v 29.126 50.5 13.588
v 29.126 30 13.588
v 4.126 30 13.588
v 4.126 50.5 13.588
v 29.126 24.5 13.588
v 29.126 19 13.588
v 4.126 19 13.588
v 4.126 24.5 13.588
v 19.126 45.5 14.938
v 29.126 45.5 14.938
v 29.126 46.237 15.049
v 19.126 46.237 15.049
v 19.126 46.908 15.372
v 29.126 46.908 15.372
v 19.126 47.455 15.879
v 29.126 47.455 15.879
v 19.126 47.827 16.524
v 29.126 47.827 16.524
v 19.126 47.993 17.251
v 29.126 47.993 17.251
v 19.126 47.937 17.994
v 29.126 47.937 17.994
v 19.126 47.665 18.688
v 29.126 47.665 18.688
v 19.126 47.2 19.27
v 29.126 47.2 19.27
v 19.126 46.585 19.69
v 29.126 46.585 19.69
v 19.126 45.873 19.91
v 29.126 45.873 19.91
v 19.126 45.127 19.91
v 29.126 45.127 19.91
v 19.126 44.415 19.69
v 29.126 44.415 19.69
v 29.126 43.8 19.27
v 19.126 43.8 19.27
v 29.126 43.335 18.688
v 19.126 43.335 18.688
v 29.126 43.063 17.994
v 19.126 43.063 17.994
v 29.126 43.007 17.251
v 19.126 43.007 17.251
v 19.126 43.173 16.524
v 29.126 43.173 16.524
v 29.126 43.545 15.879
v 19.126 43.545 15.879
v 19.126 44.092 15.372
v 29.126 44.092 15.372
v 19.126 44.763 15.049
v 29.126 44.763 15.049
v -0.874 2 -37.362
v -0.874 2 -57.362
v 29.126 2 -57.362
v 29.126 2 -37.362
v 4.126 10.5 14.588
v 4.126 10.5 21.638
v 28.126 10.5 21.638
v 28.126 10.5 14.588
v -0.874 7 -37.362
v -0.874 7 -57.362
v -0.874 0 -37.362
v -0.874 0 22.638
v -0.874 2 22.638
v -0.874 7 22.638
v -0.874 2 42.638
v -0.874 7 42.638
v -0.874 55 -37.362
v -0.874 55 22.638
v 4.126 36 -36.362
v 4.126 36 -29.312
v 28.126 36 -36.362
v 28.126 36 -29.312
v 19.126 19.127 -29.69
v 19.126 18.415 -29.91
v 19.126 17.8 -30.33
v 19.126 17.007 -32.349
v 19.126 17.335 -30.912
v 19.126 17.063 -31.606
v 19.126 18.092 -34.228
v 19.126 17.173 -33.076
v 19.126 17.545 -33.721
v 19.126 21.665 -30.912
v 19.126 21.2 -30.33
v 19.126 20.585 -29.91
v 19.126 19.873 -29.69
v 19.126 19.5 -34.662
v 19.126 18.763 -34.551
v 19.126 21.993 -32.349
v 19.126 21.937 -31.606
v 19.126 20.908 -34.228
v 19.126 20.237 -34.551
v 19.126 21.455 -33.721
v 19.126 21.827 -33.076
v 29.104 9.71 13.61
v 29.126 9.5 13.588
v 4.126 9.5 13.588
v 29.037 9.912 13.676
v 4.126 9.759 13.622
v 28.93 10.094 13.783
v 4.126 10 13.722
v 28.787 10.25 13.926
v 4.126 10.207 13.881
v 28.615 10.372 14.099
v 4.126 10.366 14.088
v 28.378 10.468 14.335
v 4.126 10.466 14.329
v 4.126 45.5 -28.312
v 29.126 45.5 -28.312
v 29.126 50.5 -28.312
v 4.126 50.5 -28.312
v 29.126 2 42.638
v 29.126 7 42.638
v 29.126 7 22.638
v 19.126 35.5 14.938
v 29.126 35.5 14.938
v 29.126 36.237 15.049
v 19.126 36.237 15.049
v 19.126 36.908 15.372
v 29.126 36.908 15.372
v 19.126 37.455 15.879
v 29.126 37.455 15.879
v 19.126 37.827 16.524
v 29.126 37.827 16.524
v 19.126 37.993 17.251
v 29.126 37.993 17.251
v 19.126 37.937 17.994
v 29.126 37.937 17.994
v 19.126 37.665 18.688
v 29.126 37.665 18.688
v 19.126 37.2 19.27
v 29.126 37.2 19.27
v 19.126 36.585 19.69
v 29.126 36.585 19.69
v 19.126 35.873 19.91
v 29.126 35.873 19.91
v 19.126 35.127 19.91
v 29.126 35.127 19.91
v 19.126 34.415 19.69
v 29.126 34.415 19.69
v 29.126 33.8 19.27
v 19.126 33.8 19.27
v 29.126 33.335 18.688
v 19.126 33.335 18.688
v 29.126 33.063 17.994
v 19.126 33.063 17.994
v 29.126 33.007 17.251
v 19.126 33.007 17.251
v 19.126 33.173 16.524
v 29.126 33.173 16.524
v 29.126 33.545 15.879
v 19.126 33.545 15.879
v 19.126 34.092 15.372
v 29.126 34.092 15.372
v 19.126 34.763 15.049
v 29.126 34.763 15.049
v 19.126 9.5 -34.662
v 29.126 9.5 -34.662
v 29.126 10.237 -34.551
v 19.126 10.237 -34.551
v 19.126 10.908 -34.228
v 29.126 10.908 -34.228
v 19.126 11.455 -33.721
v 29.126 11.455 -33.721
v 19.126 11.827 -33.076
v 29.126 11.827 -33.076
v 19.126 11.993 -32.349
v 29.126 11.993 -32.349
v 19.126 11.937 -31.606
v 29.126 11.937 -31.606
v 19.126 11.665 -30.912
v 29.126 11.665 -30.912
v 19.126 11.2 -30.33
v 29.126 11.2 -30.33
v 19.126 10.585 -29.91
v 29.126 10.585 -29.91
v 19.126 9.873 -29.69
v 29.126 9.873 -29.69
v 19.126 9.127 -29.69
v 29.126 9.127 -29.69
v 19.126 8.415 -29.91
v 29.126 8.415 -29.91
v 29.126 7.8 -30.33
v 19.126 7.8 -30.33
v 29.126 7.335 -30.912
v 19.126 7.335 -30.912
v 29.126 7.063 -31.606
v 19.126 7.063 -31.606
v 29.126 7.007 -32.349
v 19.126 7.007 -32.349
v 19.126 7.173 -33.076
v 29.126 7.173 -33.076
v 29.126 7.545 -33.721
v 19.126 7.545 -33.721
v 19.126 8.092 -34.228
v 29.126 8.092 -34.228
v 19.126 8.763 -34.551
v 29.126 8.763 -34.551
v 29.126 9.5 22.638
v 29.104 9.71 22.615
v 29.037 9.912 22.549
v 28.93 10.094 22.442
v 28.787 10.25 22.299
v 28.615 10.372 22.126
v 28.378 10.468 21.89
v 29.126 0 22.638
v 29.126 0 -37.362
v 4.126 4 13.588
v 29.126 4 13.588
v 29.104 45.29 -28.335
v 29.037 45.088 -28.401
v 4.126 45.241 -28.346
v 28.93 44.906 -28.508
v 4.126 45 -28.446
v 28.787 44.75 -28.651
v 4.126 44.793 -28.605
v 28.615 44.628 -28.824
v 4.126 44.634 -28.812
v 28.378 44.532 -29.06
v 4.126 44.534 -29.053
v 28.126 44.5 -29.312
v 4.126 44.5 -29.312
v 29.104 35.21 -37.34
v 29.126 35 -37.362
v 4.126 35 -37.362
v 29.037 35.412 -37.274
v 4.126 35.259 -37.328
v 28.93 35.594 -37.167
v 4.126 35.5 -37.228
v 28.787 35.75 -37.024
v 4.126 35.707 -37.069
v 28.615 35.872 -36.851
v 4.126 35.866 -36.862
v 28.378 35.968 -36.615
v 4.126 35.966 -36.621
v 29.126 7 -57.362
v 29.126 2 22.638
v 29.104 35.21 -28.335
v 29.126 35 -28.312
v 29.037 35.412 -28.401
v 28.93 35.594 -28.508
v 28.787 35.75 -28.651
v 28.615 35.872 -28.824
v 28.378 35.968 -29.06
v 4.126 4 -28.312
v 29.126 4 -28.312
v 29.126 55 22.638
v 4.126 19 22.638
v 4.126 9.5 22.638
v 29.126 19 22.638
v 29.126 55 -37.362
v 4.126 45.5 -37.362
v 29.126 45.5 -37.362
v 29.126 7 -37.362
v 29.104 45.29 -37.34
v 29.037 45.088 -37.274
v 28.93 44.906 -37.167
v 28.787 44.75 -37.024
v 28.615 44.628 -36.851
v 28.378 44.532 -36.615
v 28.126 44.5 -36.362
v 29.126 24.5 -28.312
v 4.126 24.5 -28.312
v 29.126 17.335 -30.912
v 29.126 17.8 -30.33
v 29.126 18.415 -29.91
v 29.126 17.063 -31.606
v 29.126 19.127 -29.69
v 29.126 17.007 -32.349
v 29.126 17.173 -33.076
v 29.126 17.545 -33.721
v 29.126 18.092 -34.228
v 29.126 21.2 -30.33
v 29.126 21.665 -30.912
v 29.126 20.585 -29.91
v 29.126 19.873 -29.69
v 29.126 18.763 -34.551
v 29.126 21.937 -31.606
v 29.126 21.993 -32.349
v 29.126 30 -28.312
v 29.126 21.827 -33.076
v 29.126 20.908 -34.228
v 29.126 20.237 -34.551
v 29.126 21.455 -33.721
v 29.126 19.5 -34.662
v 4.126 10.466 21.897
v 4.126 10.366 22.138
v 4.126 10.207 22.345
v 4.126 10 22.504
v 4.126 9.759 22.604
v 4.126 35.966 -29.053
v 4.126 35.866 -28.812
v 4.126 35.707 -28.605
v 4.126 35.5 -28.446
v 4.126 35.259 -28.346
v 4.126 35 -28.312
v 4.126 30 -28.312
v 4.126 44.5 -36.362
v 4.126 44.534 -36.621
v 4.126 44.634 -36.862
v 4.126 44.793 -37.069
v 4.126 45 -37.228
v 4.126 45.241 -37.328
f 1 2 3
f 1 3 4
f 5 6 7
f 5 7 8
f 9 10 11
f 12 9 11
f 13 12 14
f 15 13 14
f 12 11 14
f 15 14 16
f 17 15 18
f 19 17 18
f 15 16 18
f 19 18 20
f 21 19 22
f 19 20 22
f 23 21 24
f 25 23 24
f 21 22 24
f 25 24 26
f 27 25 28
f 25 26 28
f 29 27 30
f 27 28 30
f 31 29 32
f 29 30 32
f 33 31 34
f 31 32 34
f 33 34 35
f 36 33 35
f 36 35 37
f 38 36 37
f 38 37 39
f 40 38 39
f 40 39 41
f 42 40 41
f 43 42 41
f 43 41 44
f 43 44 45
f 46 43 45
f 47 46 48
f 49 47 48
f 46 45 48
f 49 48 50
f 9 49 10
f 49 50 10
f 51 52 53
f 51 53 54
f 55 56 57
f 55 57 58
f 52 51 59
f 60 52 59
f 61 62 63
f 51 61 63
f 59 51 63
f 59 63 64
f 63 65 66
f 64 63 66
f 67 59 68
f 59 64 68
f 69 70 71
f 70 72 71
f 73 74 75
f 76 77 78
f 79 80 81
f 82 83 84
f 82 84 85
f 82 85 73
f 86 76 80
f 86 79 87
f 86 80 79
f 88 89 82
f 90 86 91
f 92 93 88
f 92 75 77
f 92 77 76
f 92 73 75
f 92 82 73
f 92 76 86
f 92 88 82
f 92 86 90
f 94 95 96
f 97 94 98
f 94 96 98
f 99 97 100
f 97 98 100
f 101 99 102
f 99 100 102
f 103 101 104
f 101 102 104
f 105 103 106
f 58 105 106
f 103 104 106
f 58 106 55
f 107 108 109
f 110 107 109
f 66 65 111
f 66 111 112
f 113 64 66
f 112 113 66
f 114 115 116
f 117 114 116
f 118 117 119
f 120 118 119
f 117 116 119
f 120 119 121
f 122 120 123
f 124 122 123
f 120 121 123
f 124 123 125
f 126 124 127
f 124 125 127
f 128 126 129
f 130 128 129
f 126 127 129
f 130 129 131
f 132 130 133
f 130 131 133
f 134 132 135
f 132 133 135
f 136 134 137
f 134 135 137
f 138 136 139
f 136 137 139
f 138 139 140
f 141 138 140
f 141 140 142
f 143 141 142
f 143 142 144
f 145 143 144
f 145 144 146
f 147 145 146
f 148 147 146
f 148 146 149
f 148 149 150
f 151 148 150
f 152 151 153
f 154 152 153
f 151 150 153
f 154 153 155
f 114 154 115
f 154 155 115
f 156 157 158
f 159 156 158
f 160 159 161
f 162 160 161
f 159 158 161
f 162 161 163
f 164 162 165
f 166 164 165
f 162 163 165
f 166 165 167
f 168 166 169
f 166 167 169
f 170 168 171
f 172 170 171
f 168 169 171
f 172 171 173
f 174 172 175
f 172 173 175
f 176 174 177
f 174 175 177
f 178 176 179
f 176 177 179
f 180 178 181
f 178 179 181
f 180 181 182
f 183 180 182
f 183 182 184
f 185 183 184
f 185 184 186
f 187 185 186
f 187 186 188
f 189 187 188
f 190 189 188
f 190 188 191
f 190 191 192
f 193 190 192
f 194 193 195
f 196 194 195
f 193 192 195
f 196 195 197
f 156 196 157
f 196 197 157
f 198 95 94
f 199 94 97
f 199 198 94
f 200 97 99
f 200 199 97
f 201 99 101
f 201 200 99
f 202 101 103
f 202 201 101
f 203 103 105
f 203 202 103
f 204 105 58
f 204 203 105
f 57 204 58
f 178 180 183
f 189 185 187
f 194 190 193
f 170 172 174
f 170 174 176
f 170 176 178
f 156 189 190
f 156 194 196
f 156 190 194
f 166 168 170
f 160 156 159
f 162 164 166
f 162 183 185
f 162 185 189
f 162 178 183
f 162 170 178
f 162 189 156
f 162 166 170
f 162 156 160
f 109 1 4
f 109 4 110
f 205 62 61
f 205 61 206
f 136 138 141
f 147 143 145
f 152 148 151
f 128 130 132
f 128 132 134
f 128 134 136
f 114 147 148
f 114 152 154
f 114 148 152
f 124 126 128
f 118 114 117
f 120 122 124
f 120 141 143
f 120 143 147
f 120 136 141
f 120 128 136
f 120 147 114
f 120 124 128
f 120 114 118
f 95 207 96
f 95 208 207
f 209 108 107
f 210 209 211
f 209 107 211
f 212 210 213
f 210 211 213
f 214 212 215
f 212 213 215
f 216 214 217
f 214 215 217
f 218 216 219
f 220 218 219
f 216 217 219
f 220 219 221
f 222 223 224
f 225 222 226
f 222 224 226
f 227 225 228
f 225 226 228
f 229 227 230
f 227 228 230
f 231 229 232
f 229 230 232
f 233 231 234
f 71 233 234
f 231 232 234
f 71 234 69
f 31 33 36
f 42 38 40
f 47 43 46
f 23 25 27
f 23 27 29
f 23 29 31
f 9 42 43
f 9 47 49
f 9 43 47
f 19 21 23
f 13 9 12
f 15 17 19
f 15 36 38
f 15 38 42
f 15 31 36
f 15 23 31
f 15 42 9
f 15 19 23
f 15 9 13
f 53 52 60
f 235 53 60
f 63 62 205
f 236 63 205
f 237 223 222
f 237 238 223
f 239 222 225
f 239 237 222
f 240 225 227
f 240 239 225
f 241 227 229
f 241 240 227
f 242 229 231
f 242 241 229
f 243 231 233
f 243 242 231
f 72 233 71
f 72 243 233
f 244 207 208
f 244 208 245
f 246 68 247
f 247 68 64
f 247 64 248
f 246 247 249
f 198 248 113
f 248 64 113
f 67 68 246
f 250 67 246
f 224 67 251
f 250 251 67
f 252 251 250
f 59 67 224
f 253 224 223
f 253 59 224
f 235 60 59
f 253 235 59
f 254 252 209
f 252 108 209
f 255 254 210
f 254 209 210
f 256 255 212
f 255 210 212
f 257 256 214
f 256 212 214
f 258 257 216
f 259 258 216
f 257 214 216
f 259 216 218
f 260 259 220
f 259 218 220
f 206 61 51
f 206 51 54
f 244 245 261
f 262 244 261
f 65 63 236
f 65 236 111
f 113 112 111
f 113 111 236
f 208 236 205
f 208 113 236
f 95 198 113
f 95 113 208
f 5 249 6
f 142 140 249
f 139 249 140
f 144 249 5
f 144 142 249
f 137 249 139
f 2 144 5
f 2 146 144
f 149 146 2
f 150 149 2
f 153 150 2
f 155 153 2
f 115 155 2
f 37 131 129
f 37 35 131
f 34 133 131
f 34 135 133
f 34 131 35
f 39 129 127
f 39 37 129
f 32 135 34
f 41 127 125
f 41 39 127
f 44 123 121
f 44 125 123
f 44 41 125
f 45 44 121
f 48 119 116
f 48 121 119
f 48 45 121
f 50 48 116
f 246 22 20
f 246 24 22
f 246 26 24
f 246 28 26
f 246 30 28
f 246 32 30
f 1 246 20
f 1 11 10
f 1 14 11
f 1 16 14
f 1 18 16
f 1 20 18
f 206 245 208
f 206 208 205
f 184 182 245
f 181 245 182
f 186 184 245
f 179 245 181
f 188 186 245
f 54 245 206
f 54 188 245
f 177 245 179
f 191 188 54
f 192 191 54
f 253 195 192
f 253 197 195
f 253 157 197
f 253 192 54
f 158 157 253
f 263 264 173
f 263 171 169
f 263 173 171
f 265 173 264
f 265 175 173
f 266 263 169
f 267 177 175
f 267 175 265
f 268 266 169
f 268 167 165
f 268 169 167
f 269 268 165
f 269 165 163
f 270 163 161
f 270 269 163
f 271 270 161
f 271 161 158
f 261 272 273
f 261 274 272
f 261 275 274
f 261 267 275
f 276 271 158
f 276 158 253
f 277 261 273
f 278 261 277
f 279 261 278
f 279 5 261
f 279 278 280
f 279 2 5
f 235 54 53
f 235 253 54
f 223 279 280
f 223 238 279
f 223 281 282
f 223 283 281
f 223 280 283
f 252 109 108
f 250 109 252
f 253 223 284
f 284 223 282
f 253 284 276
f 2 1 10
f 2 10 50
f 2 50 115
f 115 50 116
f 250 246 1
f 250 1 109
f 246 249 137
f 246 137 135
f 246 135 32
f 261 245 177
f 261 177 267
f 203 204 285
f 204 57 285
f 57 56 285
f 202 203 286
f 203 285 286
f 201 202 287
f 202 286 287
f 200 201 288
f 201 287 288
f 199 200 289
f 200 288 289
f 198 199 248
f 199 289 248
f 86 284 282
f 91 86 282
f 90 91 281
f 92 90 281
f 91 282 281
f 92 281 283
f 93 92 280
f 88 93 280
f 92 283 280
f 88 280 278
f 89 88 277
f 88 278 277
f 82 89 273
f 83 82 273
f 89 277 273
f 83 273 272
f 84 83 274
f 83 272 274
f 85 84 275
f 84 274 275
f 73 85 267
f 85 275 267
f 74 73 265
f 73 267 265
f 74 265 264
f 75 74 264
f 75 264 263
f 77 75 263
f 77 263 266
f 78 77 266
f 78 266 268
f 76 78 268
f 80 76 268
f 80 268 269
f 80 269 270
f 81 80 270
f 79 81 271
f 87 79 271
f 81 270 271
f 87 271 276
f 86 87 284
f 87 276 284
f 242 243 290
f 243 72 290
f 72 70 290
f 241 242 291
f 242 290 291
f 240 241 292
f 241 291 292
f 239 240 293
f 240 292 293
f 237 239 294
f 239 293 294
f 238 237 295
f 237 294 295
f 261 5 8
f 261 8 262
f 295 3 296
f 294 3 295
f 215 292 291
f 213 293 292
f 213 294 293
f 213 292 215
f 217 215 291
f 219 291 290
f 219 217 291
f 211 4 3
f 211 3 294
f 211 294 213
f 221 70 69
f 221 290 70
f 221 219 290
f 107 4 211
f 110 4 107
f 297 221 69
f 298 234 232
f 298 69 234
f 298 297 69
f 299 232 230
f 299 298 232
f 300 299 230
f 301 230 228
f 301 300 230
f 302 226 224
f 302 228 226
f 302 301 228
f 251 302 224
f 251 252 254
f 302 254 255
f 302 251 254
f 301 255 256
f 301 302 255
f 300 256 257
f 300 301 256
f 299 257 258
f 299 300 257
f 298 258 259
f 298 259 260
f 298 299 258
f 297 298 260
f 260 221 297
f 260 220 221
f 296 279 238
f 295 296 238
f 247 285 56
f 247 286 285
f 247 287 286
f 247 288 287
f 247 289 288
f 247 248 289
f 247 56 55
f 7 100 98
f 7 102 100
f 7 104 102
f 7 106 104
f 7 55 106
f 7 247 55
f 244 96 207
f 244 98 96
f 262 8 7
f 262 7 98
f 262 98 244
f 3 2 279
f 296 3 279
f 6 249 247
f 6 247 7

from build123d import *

# Parameters (mm, degrees)
SKETCH1_W                 = 43
SKETCH1_H                 = 60
BOSS_EXTRUDE1_DEPTH       = 55
SKETCH2_W                 = 41.9
SKETCH2_H                 = 20.5
SKETCH2_H_2               = 20
CUT_EXTRUDE1_DEPTH        = 38
SKETCH3_W                 = 9.05
SKETCH3_H                 = 8.5
CUT_EXTRUDE2_DEPTH        = 38
BOSS_EXTRUDE5_START       = -0.874015748
BOSS_EXTRUDE5_OUTLINE_W   = 2.5
BOSS_EXTRUDE5_OUTLINE_H   = 41.9
BOSS_EXTRUDE5_OUTLINE_W_2 = 5
BOSS_EXTRUDE5_OUTLINE_H_2 = 20
BOSS_EXTRUDE5_DEPTH       = 30
SKETCH18_R                = 2.5
CUT_EXTRUDE9_DEPTH        = 10
SKETCH19_R                = 2.5
CUT_EXTRUDE10_DEPTH       = 10
SKETCH20_W                = 41.9
SKETCH20_H                = 5
CUT_EXTRUDE11_DEPTH       = 25
SKETCH21_W                = 60
SKETCH21_H                = 55
CUT_EXTRUDE12_DEPTH       = 13
SKETCH22_W                = 41.9
SKETCH22_H                = 2
BOSS_EXTRUDE6_DEPTH       = 25
FILLET4_R                 = 1
FILLET5_R                 = 1


# Read off the part's stored shape, not the designer's step: Boss-Extrude5
with BuildPart() as part:
    # Sketch1 → Boss-Extrude1 (new body)
    with BuildSketch(Plane(origin=(0, 0, 0), x_dir=(1, 0, 0), z_dir=(0, 1, 0))):
        with Locations((20.625984252, 7.362204724)):
            Rectangle(SKETCH1_W, SKETCH1_H)
    extrude(amount=BOSS_EXTRUDE1_DEPTH)

    # Sketch2 → Cut-Extrude1 (cut)
    with BuildSketch(Plane(origin=(42.125984252, 0, 0), x_dir=(0, 0, -1), z_dir=(1, 0, 0))):
        with Locations((7.362204724, 40.25)):
            Rectangle(SKETCH2_W, SKETCH2_H)
        with Locations((7.362204724, 14.5)):
            Rectangle(SKETCH2_W, SKETCH2_H_2)
    extrude(amount=-CUT_EXTRUDE1_DEPTH, mode=Mode.SUBTRACT)

    # Sketch3 → Cut-Extrude2 (cut)
    with BuildSketch(Plane(origin=(42.125984252, 0, 0), x_dir=(0, 0, -1), z_dir=(1, 0, 0))):
        with Locations((-18.112795276, 14.75)):
            Rectangle(SKETCH3_W, SKETCH3_H)
        with Locations((32.837204724, 40.25)):
            Rectangle(SKETCH3_W, SKETCH3_H)
    extrude(amount=-CUT_EXTRUDE2_DEPTH, mode=Mode.SUBTRACT)

    # Boss-Extrude5 outline → Boss-Extrude5 (add)
    with BuildSketch(Plane.YZ.offset(BOSS_EXTRUDE5_START)):
        with Locations((5.75, -7.362204724)):
            Rectangle(BOSS_EXTRUDE5_OUTLINE_W, BOSS_EXTRUDE5_OUTLINE_H)
        with Locations((4.5, -47.362204724)):
            Rectangle(BOSS_EXTRUDE5_OUTLINE_W_2, BOSS_EXTRUDE5_OUTLINE_H_2)
        with Locations((4.5, 32.637795276)):
            Rectangle(BOSS_EXTRUDE5_OUTLINE_W_2, BOSS_EXTRUDE5_OUTLINE_H_2)
    extrude(amount=BOSS_EXTRUDE5_DEPTH)

    # Sketch18 → Cut-Extrude9 (cut)
    with BuildSketch(Plane(origin=(29.125984252, 0, 0), x_dir=(0, 0, -1), z_dir=(1, 0, 0))):
        with Locations((-17.437795276, 45.5)):
            Circle(SKETCH18_R)
        with Locations((-17.437795276, 35.5)):
            Circle(SKETCH18_R)
    extrude(amount=-CUT_EXTRUDE9_DEPTH, mode=Mode.SUBTRACT)

    # Sketch19 → Cut-Extrude10 (cut)
    with BuildSketch(Plane(origin=(29.125984252, 0, 0), x_dir=(0, 0, -1), z_dir=(1, 0, 0))):
        with Locations((32.162204724, 19.5)):
            Circle(SKETCH19_R)
        with Locations((32.162204724, 9.5)):
            Circle(SKETCH19_R)
    extrude(amount=-CUT_EXTRUDE10_DEPTH, mode=Mode.SUBTRACT)

    # Sketch20 → Cut-Extrude11 (cut)
    with BuildSketch(Plane(origin=(29.125984252, 0, 0), x_dir=(0, 0, -1), z_dir=(1, 0, 0))):
        with Locations((7.362204724, 4.5)):
            Rectangle(SKETCH20_W, SKETCH20_H)
    extrude(amount=-CUT_EXTRUDE11_DEPTH, mode=Mode.SUBTRACT)

    # Sketch21 → Cut-Extrude12 (cut)
    with BuildSketch(Plane(origin=(42.125984252, 0, 0), x_dir=(0, 0, -1), z_dir=(1, 0, 0))):
        with Locations((7.362204724, 27.5)):
            Rectangle(SKETCH21_W, SKETCH21_H)
    extrude(amount=-CUT_EXTRUDE12_DEPTH, mode=Mode.SUBTRACT)

    # Sketch22 → Boss-Extrude6 (add)
    with BuildSketch(Plane(origin=(4.125984252, 0, 0), x_dir=(0, 0, -1), z_dir=(1, 0, 0))):
        with Locations((7.362204724, 3)):
            Rectangle(SKETCH22_W, SKETCH22_H)
    extrude(amount=BOSS_EXTRUDE6_DEPTH)

    # Fillet4
    fillet4_edges = [part.edges().sort_by_distance(p)[0] for p in [
        (29.125984252, 44.5, -32.837204724),
        (29.125984252, 36, -32.837204724),
        (16.625984252, 36, -28.312204724),
        (16.625984252, 44.5, -28.312204724),
        (16.625984252, 44.5, -37.362204724),
        (16.625984252, 36, -37.362204724),
    ]]
    fillet(fillet4_edges, radius=FILLET4_R)

    # Fillet5
    fillet5_edges = [part.edges().sort_by_distance(p)[0] for p in [
        (29.125984252, 10.5, 18.112795276),
        (16.625984252, 10.5, 22.637795276),
        (16.625984252, 10.5, 13.587795276),
    ]]
    fillet(fillet5_edges, radius=FILLET5_R)


solid = part.part
